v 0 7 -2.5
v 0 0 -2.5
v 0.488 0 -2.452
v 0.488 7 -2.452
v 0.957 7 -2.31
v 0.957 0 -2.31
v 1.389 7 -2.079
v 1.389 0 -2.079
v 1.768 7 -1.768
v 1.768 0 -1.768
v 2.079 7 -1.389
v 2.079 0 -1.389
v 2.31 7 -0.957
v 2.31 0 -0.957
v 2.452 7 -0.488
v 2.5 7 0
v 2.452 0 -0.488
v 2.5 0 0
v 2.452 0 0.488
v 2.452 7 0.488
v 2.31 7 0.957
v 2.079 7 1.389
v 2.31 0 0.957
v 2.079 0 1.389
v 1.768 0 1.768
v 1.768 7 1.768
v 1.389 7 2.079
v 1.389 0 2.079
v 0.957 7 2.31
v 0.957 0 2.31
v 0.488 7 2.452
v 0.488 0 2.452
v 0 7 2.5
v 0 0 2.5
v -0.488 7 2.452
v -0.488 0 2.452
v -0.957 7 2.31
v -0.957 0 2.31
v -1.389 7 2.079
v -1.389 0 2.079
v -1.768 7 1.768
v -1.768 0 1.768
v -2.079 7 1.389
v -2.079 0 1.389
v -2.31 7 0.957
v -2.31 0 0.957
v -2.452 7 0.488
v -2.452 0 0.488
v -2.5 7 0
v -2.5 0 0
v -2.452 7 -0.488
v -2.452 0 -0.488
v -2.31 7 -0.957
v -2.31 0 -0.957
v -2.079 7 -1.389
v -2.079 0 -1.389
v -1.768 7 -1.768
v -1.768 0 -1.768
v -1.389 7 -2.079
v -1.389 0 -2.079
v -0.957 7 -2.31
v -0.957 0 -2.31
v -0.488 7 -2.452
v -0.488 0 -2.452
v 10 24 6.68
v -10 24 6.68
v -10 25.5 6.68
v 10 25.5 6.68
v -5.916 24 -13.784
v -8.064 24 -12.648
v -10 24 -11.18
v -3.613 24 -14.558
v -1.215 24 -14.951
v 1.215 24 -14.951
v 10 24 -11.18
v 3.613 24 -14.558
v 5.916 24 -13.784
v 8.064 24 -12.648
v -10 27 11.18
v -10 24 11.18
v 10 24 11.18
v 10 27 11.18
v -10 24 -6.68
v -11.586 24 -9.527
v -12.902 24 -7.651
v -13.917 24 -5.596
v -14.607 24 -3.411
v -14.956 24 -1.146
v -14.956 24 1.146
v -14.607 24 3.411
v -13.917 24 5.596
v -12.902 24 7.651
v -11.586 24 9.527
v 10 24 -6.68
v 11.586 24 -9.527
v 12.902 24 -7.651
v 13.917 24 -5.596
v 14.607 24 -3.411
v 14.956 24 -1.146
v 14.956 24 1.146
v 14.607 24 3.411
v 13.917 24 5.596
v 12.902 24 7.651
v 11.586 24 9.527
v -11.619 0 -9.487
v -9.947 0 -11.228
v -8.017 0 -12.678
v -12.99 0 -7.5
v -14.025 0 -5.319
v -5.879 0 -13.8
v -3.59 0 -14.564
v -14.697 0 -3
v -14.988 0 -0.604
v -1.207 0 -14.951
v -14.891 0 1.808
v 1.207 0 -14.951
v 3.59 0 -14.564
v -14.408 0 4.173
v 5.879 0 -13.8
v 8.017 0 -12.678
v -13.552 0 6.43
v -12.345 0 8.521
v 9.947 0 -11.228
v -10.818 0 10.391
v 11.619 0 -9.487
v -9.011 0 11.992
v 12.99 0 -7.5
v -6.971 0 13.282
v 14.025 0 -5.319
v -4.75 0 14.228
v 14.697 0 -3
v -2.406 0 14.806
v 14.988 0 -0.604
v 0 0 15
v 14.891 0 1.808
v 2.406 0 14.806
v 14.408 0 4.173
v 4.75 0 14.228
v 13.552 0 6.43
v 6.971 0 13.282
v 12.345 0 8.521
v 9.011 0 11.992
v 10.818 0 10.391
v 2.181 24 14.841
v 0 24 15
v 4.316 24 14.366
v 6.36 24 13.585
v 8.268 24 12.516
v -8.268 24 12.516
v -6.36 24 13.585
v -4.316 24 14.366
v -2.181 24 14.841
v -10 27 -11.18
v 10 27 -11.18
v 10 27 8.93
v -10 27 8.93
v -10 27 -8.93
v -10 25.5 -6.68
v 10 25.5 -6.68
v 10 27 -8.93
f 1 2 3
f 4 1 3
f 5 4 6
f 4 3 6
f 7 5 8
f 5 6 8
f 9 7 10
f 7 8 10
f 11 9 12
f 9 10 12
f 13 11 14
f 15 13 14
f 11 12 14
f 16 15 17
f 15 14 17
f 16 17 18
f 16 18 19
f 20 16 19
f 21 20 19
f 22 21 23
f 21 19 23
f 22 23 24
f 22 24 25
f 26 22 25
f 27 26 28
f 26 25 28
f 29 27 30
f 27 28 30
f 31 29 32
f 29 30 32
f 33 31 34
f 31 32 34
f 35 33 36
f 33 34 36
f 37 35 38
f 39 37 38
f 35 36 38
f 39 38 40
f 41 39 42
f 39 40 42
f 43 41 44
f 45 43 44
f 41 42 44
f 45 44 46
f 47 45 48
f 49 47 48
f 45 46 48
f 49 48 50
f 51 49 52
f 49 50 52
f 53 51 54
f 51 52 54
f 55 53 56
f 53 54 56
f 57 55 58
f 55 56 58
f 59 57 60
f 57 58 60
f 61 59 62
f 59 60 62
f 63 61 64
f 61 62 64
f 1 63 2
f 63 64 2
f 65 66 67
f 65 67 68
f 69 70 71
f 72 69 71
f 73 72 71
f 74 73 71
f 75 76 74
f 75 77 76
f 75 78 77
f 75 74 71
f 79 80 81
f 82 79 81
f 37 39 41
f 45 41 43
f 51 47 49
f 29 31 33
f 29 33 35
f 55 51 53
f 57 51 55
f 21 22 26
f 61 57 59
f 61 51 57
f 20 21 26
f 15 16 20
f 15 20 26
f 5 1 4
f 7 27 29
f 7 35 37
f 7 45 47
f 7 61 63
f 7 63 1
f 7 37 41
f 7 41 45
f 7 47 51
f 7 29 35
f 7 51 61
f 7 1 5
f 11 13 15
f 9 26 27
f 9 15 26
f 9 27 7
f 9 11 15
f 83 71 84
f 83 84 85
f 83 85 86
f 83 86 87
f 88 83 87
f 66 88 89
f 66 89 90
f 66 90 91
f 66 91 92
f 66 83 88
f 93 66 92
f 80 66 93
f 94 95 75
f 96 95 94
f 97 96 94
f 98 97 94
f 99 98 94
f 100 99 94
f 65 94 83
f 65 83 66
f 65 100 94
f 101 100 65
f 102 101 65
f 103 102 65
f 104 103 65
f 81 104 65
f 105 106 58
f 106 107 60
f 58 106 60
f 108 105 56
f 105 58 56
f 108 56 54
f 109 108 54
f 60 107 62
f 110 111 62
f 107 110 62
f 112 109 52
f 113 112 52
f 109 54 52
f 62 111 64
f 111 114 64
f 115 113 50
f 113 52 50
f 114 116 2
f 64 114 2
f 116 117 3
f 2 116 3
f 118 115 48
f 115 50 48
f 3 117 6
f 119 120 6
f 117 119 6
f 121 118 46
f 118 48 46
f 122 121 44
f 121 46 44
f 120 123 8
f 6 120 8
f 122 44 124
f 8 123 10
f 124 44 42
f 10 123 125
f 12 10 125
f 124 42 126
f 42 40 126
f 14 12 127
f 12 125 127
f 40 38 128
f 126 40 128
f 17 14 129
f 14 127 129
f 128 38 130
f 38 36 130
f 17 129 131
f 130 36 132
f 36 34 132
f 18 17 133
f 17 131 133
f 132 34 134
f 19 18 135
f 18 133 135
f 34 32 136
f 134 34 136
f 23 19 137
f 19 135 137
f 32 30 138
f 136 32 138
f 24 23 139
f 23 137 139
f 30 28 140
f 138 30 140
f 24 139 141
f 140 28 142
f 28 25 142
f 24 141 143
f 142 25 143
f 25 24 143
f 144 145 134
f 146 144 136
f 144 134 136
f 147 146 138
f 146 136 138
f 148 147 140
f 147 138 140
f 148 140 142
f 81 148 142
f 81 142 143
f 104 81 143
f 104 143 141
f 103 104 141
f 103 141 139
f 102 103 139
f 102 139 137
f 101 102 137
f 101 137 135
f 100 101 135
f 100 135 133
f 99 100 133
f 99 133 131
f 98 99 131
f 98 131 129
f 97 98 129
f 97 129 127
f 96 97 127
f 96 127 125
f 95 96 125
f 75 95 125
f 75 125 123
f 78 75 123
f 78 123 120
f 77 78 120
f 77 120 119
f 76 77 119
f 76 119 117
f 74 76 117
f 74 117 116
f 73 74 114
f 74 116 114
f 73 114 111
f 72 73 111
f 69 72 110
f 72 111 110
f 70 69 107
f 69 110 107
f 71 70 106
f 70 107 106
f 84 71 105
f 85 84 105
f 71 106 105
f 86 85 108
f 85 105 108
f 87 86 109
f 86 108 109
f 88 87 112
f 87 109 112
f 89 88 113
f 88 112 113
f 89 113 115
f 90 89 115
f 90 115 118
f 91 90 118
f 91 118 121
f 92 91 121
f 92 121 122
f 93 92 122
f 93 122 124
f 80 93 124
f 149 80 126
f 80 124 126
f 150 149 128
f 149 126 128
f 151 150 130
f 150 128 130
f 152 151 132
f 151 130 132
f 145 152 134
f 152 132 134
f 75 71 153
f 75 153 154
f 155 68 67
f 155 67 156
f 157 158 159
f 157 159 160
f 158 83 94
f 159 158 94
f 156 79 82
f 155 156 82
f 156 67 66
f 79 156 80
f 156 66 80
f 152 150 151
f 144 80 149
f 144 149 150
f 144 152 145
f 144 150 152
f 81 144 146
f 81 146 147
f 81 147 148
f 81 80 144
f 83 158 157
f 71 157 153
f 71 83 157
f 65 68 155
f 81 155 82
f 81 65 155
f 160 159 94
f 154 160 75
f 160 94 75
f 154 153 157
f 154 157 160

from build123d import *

# Parameters (mm, degrees)
SKETCH1_R           = 15
BOSS_EXTRUDE1_DEPTH = 24
SKETCH2_W           = 20
SKETCH2_H           = 4.5
BOSS_EXTRUDE2_DEPTH = 3
CUT_EXTRUDE1_DEPTH  = 43
SKETCH4_R           = 2.5
CUT_EXTRUDE2_DEPTH  = 7


with BuildPart() as part:
    # Sketch1 → Boss-Extrude1 (new body)
    with BuildSketch(Plane(origin=(0, 0, 0), x_dir=(1, 0, 0), z_dir=(0, 1, 0))):
        with Locations(Location((0, 0, 0), (0, 0, 270))):
            Circle(SKETCH1_R)
    extrude(amount=BOSS_EXTRUDE1_DEPTH)

    # Sketch2 → Boss-Extrude2 (add)
    with BuildSketch(Plane(origin=(0, 24, 0), x_dir=(1, 0, 0), z_dir=(0, 1, 0))):
        with Locations((0, 8.930339887)):
            Rectangle(SKETCH2_W, SKETCH2_H)
    extrude(amount=BOSS_EXTRUDE2_DEPTH)

    # Sketch3 → Cut-Extrude1 (cut)
    with BuildSketch(Plane(origin=(10, 0, 0), x_dir=(0, 0, -1), z_dir=(1, 0, 0))):
        Polygon((6.680339887, 25.5), (8.930339887, 27), (6.680339887, 27), align=None)
    extrude(amount=-CUT_EXTRUDE1_DEPTH, mode=Mode.SUBTRACT)

    # Mirror1: part across plane


with BuildPart() as part_1:
    add(part.part)
    add(part.part.mirror(Plane.XY))

    # Sketch4 → Cut-Extrude2 (cut)
    with BuildSketch(Plane.XZ):
        with Locations(Location((0, 0, 0), (0, 0, 270))):
            Circle(SKETCH4_R)
    extrude(amount=-CUT_EXTRUDE2_DEPTH, mode=Mode.SUBTRACT)


solid = part_1.part
